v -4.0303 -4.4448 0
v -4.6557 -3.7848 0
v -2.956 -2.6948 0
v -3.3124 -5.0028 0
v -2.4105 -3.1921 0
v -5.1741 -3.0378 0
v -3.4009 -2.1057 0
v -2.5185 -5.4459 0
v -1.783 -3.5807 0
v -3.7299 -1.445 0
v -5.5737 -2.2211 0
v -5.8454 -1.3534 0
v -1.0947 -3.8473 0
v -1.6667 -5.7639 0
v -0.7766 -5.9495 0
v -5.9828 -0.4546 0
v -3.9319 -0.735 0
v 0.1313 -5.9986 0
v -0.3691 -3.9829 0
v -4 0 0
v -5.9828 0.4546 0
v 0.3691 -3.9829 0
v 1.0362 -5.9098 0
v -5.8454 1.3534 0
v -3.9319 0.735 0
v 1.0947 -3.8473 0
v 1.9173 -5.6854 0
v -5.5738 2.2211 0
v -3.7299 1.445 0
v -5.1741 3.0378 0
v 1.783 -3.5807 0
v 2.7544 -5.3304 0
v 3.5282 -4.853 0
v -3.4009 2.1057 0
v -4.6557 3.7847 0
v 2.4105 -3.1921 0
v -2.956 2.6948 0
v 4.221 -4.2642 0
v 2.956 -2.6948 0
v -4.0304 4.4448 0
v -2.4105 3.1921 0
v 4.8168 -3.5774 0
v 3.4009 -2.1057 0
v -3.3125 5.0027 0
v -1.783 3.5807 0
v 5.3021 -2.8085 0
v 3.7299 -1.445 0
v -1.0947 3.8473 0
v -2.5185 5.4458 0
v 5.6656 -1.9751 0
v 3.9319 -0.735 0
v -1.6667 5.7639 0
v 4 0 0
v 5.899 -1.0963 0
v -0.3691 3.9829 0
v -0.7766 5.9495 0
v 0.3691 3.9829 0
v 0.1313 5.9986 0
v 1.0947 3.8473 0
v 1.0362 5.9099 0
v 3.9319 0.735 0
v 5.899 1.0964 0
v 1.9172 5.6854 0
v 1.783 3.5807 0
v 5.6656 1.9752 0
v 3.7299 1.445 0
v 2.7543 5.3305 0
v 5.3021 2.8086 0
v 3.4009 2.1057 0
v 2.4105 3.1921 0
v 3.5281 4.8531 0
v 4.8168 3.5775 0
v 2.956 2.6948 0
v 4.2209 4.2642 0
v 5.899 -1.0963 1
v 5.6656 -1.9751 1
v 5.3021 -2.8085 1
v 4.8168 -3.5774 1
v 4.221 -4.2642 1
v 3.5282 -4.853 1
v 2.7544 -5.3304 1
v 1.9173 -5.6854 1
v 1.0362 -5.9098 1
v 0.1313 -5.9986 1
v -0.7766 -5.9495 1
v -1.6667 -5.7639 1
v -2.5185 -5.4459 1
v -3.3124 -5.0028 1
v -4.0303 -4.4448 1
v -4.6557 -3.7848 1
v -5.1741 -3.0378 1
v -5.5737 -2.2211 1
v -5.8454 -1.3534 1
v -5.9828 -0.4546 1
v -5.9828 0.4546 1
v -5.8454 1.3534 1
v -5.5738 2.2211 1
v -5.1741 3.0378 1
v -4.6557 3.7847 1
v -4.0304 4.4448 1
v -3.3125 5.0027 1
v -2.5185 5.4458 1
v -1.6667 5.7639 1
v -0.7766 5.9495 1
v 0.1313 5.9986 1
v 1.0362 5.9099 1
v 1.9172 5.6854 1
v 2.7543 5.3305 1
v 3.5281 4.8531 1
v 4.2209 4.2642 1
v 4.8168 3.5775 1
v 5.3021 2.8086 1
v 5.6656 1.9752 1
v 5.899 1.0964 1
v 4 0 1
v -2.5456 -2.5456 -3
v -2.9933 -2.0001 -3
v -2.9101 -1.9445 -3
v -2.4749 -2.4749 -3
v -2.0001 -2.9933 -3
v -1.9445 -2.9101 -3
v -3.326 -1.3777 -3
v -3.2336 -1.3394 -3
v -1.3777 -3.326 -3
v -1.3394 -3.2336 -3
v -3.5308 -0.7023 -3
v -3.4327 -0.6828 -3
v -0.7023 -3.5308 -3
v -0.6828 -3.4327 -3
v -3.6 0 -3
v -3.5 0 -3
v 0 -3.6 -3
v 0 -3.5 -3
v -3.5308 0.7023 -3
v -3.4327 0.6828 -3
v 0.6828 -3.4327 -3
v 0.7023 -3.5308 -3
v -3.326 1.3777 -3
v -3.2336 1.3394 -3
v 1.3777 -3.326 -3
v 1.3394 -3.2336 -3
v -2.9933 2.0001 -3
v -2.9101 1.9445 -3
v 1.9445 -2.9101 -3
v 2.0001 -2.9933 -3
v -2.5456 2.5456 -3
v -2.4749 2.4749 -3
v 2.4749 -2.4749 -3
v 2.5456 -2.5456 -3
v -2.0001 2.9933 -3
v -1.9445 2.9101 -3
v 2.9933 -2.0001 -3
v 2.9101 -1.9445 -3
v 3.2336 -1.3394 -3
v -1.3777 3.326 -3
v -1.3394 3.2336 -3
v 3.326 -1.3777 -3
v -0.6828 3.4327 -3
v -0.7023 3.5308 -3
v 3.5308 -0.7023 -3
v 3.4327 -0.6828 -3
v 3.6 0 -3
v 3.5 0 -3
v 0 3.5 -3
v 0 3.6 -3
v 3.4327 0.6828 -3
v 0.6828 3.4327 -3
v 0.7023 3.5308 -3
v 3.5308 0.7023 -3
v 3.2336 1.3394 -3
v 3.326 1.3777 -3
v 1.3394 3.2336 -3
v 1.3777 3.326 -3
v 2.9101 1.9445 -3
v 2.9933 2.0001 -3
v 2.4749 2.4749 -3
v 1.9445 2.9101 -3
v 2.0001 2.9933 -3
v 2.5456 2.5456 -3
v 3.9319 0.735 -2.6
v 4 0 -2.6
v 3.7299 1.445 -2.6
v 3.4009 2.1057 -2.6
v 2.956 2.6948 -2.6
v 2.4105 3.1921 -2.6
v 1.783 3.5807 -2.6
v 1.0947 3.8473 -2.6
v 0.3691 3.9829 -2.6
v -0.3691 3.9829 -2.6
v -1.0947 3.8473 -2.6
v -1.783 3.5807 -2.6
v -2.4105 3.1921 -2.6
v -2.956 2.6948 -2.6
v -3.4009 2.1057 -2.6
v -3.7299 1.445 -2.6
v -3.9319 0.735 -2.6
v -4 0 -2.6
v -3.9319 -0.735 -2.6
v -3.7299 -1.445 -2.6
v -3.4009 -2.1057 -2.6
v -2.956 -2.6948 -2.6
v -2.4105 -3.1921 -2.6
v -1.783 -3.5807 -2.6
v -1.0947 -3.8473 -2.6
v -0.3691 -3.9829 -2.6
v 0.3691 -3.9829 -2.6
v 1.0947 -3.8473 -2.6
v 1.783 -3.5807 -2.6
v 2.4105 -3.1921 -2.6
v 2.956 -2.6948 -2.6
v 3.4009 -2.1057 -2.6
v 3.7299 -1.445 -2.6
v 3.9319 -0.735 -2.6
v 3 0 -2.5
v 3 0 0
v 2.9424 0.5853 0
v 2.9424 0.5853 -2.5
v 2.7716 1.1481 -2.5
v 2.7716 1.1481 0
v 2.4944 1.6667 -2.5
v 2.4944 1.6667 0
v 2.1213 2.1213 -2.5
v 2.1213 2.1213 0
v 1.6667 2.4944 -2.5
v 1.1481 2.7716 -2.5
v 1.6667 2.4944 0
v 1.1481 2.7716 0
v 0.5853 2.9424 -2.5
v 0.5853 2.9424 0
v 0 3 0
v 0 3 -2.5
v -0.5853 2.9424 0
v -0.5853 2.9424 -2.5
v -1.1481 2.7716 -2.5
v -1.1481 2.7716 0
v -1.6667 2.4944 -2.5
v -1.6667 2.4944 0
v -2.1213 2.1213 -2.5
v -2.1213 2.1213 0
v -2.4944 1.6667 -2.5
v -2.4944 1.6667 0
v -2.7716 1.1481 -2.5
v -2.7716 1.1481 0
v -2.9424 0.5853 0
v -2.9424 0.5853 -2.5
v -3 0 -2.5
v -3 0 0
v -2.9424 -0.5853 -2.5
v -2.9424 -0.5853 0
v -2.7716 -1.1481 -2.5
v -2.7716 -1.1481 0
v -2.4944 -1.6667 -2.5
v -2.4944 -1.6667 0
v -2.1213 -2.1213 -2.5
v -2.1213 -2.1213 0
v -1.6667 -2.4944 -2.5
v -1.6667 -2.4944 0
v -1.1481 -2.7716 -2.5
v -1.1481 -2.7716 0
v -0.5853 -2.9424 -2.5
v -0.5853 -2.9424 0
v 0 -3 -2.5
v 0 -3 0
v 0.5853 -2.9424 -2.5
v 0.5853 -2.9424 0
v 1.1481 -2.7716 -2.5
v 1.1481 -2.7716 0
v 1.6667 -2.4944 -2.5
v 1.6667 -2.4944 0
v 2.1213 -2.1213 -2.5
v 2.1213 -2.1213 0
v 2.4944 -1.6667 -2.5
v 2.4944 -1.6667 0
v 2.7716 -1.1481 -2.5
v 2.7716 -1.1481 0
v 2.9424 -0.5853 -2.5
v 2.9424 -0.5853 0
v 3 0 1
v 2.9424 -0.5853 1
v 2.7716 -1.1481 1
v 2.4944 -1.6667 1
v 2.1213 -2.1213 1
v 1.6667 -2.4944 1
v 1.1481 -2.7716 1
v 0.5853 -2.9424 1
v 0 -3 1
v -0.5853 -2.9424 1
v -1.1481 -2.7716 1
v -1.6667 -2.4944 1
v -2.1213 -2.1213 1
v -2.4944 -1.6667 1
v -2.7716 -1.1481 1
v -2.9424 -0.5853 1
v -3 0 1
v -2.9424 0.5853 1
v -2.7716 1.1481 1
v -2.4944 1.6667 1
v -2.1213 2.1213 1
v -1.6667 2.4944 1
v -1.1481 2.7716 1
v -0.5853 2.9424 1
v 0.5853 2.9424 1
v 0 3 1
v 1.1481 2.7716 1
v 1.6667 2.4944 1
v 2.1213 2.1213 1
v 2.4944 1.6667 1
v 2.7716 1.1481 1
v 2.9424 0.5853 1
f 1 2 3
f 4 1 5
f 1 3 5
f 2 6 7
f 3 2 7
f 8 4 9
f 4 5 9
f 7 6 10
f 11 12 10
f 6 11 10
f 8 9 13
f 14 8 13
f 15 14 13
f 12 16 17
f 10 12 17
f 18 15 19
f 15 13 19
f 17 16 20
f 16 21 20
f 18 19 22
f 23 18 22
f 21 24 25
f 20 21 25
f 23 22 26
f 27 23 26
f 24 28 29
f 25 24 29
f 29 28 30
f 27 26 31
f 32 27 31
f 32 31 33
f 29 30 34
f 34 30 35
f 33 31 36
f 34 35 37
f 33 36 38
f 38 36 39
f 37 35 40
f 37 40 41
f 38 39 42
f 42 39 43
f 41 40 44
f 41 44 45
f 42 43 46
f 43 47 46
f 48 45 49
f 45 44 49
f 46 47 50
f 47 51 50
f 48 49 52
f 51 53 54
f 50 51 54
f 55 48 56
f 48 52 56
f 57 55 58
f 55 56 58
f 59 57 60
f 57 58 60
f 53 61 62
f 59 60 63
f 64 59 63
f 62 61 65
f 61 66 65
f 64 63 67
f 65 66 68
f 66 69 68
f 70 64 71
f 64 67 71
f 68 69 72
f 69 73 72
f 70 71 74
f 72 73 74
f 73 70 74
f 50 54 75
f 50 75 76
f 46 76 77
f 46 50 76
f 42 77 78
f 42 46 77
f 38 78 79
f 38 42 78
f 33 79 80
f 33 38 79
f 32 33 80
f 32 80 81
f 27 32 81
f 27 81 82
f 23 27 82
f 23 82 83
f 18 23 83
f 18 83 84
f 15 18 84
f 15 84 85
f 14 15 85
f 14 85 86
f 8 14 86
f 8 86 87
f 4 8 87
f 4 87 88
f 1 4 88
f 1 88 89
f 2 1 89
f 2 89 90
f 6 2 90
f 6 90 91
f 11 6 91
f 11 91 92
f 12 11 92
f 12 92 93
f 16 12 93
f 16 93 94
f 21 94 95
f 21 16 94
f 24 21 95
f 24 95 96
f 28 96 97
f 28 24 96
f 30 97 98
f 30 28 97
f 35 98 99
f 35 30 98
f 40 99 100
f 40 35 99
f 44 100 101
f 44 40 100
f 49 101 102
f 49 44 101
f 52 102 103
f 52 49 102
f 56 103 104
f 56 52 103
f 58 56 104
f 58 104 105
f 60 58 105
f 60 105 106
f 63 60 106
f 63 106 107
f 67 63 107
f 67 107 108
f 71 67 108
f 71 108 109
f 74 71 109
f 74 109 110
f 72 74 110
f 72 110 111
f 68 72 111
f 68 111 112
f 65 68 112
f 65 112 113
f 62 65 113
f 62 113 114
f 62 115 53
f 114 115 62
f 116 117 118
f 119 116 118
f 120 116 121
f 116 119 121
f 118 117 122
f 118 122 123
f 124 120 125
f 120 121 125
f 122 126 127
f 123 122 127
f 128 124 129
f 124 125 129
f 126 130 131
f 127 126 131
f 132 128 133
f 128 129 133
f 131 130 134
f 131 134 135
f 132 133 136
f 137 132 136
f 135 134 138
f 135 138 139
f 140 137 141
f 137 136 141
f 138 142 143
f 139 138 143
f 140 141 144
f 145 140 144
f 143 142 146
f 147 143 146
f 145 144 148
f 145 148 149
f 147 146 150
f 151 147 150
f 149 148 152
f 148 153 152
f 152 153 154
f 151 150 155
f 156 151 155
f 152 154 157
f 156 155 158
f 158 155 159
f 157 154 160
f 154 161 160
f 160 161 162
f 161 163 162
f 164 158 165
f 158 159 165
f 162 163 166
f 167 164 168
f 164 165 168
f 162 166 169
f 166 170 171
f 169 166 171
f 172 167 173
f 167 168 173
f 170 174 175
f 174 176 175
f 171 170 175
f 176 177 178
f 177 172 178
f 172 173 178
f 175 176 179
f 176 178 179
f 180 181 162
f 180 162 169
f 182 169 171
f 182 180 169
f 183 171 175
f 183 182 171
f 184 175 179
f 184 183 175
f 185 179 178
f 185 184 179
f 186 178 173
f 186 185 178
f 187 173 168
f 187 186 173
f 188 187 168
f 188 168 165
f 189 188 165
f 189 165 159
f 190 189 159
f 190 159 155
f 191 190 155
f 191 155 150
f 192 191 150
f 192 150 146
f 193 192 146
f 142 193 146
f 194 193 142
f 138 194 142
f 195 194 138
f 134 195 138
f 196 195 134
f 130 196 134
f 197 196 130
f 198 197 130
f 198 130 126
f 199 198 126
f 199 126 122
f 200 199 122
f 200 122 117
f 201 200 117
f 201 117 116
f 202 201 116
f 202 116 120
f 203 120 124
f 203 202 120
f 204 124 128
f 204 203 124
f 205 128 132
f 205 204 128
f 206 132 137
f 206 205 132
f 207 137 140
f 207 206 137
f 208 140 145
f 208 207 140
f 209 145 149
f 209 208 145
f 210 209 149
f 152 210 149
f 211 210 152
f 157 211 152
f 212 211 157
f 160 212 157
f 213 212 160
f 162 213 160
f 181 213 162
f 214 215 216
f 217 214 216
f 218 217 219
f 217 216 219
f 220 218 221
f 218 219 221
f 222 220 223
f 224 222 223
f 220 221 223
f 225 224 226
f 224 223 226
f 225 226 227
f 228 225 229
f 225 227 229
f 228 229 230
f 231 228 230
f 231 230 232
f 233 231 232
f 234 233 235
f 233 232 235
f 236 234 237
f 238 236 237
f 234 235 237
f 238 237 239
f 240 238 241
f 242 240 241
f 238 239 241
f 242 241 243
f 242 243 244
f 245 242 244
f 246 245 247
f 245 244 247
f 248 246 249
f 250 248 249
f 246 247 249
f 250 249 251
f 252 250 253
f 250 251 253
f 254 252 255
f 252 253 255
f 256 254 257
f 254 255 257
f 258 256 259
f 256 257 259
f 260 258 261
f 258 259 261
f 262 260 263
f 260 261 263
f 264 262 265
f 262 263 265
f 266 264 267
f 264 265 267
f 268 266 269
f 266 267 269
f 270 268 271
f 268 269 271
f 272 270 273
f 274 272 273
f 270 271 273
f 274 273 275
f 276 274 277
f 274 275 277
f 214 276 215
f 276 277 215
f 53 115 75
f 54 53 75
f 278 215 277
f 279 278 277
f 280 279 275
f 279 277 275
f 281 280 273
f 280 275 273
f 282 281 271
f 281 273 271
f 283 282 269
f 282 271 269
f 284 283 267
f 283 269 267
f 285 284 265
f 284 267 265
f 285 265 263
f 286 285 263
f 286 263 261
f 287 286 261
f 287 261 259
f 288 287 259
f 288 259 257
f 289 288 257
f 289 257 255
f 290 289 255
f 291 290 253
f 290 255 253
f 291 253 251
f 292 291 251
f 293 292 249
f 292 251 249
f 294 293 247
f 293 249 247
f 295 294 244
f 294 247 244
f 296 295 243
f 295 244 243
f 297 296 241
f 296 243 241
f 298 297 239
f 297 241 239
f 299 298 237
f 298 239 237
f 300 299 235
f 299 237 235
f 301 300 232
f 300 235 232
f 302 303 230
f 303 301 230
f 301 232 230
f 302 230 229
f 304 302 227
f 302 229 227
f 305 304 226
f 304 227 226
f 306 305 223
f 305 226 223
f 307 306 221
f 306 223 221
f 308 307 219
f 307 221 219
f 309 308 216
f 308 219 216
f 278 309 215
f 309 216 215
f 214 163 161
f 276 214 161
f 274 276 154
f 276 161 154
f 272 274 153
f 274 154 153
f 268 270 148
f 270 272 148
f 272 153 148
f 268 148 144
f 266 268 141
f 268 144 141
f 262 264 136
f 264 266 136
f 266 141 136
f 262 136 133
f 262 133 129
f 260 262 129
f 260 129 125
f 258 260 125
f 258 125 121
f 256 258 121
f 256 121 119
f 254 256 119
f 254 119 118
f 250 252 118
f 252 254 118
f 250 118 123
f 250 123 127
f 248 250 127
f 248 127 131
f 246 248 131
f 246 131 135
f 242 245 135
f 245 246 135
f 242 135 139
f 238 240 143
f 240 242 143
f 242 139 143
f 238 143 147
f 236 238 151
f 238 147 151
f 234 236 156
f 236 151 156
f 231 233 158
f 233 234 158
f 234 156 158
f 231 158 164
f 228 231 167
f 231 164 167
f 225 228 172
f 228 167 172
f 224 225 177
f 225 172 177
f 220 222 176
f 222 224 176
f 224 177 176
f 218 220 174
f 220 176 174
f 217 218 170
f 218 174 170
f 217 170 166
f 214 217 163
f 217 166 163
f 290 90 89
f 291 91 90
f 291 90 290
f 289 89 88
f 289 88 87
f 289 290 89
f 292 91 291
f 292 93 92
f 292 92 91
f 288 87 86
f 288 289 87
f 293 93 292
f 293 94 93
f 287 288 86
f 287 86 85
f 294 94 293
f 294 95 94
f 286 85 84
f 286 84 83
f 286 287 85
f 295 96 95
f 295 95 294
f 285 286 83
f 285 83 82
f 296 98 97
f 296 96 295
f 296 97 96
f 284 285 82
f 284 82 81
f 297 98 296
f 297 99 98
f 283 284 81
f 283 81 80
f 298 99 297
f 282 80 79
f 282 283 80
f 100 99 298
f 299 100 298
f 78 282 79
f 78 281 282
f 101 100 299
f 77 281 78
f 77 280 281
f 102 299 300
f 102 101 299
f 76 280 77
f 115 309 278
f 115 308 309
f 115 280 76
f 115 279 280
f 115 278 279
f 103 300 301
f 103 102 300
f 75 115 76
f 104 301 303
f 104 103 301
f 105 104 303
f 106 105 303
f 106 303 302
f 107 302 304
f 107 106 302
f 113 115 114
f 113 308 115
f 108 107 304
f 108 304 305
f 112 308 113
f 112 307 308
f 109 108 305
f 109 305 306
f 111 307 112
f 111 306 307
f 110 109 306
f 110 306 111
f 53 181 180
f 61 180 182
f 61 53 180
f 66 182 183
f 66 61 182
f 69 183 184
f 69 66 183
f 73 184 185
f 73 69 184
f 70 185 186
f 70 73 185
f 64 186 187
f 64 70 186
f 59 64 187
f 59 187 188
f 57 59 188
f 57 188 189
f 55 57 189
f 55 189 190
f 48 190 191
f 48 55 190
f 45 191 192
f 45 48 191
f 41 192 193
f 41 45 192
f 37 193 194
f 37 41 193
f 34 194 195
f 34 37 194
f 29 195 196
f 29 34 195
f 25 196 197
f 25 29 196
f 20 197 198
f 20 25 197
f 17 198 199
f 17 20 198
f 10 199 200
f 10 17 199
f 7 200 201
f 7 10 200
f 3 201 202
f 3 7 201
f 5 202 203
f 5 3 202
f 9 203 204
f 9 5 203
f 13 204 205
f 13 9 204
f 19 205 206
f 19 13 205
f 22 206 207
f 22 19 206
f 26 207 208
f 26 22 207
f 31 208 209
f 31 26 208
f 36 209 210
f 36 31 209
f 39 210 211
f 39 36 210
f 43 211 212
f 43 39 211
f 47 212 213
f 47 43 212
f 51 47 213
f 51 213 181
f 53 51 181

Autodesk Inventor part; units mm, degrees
ref_plane "YZ Plane" through (0, 0, 0) normal (1, 0, 0) x (0, 1, 0)
ref_plane "XZ Plane" through (0, 0, 0) normal (0, 1, 0) x (-1, 0, 0)
ref_plane "XY Plane" through (0, 0, 0) normal (0, 0, 1) x (1, 0, 0)
sketch "Szkic1" plane through (0, 0, 0) normal (0, 0, 1) x (1, 0, 0)
  circle A0 centre (0, 0) radius 3
  circle A1 centre (0, 0) radius 4
  circle A2 centre (0, 0) radius 6
  dimension "d0" = 6
  dimension "d1" = 8
  dimension "d2" = 12
extrude "Wyciągnięcie proste1" add sketch "Szkic1" along normal blind 1 contours A1 | A2
extrude "Wyciągnięcie proste2" add sketch "Szkic1" against normal blind 3 contours A1
sketch "Szkic2" plane through (0, 0, 1) normal (0, 0, 1) x (1, 0, 0)
  circle A0 centre (0, 0) radius 4 projected
  line L0 (4, 0) -> (5.899, 1.0964)
  circle A1 centre (0, 0) radius 6 projected
  line L1 (4, 0) -> (5.9306, -1.1146)
  line L2 (4, 0) -> (6, 0) construction
  circle A2 centre (0, 0) radius 6 construction
  circle A3 centre (0, 0) radius 6 construction
  circle A4 centre (0, 0) radius 3 construction
  point P0 (5.899, -1.0964)
  dimension "d7" = 60
  dimension "d8" = 30
extrude "Wyciągnięcie proste3" cut sketch "Szkic2" against normal blind 10 contours L0 A1 L1 picked at (5.2847, 0.6099)
chamfer "Faza1" distance 0.4 angle 45 1 edges at (-4, 0, -3)
chamfer "Faza2" distance 0.5 angle 45 1 edges at (-3, 0, -3)
equation "\"d8\" = 0.5 * d7"
properties part number "tuleja_TUF106040"
